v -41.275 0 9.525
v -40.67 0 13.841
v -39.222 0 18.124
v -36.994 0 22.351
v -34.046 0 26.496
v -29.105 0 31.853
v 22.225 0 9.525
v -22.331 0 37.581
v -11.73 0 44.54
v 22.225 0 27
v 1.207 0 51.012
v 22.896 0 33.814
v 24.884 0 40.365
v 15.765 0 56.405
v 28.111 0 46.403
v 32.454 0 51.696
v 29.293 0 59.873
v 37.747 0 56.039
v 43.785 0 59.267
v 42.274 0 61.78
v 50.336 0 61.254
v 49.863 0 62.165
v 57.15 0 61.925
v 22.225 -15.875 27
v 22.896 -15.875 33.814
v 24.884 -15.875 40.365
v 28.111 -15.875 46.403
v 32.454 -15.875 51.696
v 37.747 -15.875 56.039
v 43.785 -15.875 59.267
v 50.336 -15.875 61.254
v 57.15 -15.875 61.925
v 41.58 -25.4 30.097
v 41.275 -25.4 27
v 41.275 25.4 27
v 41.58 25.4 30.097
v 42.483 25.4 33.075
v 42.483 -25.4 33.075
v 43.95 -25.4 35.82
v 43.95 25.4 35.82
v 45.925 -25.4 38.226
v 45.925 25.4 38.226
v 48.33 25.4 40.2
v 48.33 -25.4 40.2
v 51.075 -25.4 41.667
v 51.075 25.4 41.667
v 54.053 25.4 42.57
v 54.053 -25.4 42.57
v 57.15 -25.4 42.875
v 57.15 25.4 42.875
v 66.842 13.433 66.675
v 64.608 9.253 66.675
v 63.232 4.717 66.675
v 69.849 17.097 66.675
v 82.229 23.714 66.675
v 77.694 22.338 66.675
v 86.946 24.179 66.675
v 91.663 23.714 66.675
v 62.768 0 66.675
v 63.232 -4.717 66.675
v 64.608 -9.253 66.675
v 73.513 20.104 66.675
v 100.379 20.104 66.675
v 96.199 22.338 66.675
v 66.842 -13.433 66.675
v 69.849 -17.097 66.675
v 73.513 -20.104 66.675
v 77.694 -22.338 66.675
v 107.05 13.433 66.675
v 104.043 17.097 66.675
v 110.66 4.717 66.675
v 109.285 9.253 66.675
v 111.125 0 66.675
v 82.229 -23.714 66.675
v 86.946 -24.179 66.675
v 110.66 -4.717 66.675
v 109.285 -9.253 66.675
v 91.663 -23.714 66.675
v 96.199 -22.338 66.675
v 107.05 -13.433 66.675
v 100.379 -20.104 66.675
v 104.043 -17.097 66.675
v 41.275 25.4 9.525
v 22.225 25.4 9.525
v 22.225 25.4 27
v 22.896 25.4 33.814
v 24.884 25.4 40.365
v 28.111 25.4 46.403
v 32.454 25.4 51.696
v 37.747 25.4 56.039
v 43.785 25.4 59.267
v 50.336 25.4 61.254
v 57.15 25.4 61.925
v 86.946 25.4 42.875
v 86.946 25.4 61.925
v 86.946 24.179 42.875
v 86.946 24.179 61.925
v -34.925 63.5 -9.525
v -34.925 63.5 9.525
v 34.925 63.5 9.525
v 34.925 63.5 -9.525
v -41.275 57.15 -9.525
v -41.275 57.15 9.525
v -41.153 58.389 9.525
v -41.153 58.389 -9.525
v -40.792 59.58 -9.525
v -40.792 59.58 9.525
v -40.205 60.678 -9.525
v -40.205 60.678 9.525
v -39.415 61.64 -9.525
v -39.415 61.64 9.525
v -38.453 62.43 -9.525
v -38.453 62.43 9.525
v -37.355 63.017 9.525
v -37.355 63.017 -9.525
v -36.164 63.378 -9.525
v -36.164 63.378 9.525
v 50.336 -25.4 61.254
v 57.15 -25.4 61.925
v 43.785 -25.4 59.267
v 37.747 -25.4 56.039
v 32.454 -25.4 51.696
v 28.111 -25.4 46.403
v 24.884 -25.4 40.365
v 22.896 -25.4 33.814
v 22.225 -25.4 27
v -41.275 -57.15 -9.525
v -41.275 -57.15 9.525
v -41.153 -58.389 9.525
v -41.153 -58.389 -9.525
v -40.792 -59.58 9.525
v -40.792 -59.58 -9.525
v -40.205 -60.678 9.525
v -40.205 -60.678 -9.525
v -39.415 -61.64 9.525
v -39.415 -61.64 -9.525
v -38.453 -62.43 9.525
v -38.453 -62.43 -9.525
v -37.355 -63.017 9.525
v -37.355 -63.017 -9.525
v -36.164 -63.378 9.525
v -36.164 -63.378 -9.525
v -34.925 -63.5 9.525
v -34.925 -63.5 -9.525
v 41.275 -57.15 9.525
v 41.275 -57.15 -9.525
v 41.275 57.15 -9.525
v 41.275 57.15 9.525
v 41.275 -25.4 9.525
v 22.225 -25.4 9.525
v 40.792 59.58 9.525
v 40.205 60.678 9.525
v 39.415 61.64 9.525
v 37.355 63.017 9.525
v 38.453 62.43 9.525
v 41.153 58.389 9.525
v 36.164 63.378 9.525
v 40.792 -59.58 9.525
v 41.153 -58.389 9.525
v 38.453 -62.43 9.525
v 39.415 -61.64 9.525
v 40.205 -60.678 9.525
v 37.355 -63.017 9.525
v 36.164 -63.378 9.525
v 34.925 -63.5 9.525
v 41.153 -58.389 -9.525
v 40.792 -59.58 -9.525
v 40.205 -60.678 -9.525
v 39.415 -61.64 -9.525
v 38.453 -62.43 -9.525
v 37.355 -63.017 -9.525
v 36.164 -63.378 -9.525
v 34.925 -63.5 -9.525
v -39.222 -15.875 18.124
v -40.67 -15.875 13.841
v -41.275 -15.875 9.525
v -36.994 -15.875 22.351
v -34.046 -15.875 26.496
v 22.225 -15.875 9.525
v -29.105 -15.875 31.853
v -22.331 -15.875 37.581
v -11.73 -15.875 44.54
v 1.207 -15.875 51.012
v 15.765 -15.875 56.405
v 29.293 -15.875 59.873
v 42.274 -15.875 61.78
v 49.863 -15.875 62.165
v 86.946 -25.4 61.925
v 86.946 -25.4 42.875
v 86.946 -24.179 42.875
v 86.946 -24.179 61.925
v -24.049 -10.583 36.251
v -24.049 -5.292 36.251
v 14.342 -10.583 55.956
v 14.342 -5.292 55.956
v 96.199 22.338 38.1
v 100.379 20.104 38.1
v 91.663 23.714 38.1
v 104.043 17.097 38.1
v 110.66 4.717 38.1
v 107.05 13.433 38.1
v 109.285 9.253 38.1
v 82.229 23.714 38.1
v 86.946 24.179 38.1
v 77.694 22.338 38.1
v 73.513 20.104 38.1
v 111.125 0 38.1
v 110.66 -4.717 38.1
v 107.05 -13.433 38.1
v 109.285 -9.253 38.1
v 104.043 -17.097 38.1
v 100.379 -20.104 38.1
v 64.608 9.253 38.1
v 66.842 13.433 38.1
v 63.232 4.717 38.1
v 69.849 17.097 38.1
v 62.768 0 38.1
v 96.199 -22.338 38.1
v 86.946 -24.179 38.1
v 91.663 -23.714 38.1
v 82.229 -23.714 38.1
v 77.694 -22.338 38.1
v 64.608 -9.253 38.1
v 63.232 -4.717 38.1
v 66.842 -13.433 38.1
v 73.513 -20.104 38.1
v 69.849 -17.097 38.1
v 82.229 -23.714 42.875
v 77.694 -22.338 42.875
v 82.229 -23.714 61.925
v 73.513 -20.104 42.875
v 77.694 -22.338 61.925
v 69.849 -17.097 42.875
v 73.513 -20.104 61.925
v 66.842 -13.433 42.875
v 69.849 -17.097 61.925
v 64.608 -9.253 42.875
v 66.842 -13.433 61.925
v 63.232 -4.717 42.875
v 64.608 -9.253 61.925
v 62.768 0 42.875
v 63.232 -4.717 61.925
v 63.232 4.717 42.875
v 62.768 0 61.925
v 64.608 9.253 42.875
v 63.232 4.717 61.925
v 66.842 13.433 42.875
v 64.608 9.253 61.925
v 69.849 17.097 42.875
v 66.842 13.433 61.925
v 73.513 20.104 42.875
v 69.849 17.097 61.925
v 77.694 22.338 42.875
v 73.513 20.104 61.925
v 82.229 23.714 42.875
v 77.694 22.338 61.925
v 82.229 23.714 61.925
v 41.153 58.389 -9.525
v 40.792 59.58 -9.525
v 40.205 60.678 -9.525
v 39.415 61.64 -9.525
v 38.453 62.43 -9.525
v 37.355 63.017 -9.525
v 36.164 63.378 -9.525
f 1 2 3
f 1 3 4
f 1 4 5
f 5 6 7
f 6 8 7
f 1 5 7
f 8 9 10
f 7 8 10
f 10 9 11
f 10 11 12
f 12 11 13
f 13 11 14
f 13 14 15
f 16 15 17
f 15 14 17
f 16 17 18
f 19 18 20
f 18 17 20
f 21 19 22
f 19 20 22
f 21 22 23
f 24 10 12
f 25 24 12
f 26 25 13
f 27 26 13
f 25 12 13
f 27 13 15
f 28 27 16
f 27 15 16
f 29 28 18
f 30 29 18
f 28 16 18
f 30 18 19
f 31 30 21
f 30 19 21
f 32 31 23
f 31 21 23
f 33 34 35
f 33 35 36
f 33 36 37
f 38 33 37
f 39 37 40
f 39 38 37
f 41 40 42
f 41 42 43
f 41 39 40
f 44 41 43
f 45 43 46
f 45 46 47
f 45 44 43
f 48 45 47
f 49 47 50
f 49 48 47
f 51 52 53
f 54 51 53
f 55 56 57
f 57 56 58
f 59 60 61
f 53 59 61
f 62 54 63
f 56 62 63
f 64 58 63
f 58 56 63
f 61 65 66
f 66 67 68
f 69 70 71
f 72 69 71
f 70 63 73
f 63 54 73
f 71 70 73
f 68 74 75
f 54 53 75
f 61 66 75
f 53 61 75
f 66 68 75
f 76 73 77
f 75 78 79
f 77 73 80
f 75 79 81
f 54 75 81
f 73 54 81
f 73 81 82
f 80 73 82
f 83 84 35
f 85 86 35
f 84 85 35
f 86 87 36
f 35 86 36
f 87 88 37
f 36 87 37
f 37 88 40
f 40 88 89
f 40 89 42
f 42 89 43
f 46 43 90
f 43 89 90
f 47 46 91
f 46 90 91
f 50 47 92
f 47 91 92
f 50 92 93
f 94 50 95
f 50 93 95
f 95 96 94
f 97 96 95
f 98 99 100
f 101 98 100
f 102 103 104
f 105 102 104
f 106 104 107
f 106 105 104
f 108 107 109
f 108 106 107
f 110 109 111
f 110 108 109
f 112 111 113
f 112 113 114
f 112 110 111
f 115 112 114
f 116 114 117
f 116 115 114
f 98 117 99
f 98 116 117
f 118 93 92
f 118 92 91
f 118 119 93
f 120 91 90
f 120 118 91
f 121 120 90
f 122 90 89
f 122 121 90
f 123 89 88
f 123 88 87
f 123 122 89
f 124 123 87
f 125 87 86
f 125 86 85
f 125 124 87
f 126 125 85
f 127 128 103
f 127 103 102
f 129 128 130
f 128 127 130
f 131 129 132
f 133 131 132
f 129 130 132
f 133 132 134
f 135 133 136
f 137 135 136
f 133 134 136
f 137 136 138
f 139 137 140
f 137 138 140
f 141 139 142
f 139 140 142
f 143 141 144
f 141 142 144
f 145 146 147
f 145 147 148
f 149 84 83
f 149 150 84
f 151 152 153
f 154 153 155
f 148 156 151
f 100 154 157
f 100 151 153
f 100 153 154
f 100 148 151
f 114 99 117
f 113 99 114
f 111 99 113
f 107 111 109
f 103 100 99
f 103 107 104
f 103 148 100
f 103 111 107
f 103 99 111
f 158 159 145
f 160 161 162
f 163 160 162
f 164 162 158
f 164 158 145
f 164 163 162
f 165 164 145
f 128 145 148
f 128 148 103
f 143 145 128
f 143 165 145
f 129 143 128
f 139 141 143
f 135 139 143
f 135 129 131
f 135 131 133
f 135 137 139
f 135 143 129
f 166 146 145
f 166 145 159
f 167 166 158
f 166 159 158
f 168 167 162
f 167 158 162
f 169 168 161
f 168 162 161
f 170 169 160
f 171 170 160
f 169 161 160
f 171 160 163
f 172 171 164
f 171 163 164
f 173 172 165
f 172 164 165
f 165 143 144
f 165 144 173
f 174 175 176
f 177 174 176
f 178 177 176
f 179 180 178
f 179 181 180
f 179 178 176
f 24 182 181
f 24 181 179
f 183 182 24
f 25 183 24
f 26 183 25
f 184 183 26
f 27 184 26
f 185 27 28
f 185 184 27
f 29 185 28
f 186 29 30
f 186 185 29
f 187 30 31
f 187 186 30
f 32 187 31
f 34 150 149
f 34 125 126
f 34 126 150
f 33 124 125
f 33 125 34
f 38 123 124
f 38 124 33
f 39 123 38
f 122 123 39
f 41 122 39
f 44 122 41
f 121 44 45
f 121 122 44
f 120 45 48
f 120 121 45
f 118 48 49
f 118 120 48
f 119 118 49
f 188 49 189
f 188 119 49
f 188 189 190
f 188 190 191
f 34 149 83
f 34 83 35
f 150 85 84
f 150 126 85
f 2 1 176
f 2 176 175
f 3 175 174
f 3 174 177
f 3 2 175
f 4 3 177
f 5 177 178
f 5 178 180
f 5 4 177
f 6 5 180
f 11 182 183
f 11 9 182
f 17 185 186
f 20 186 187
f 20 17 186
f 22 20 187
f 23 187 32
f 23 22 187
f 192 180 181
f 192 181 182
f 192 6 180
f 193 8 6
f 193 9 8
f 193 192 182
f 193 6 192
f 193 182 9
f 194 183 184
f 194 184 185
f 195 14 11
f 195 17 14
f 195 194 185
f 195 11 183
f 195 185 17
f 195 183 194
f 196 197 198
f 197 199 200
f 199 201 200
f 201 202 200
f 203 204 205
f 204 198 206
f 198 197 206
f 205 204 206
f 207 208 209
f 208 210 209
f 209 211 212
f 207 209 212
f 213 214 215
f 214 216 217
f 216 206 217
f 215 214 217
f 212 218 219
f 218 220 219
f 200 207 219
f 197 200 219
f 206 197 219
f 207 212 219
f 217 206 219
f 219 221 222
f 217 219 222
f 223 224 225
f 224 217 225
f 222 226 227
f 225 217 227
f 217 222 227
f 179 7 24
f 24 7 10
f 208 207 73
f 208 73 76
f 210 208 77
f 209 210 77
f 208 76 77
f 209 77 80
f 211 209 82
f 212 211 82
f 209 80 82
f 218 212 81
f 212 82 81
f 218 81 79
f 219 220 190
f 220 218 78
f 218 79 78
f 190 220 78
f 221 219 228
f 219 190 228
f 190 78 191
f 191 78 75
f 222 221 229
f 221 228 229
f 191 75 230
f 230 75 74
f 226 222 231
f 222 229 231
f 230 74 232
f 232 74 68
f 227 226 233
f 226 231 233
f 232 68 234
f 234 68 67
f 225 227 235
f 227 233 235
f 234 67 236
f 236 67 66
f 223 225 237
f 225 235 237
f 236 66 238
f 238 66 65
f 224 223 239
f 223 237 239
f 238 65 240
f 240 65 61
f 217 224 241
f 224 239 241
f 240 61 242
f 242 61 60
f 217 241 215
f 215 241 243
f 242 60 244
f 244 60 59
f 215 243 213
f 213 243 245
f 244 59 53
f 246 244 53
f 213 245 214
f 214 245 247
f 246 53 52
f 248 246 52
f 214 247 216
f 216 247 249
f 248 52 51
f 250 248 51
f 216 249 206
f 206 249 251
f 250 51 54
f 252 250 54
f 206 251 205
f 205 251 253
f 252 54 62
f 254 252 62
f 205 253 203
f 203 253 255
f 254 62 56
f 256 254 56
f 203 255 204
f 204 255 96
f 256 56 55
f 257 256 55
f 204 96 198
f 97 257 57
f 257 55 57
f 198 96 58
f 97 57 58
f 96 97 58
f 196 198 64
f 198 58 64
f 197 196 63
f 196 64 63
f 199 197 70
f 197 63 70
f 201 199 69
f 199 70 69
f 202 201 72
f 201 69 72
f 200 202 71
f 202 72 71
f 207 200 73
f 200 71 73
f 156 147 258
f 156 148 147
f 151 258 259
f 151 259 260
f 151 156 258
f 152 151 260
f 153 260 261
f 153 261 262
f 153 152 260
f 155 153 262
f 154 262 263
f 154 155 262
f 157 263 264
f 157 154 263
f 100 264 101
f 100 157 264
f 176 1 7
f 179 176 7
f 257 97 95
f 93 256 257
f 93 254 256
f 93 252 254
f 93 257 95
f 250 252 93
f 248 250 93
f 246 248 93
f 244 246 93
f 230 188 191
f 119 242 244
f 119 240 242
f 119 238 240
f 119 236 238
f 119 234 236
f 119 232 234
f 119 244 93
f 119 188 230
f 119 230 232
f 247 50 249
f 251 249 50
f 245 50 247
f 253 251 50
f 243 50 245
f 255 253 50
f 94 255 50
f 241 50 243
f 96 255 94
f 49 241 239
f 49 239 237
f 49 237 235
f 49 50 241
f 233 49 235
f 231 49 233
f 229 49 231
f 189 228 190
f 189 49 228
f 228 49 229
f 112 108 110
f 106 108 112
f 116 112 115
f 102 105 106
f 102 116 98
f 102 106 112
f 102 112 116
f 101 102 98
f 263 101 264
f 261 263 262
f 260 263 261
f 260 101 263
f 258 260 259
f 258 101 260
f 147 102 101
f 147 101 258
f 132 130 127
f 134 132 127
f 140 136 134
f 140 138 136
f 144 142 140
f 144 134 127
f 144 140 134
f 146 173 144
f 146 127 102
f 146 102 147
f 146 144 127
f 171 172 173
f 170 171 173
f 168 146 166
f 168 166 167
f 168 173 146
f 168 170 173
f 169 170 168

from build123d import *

# Parameters (mm, degrees)
F1_DEPTH = 63.5
F0_W     = 26.6213221727
F0_H     = 19.05
F2_DEPTH = 25.4
F3_DEPTH = 15.875
F5_R     = 6.35


with BuildPart() as f1:
    # F0 (on Front) → F1 (new body, symmetric)
    with BuildSketch(Plane.XZ):
        Polygon((41.275, -9.525), (41.275, 9.525), (22.225, 9.525), (-41.275, 9.525), (-41.275, -9.525), align=None)
    extrude(amount=F1_DEPTH, both=True)

    # F5
    f5_edges = [f1.edges().sort_by_distance(p)[0] for p in [
        (41.275, -63.5, 0),
        (-41.275, -63.5, 0),
        (-41.275, 63.5, 0),
        (41.275, 63.5, 0),
    ]]
    fillet(f5_edges, radius=F5_R)


with BuildPart() as f2:
    # F0 (on Front) → F2 (new body, symmetric)
    with BuildSketch(Plane.XZ):
        with BuildLine():
            Line((22.225, 9.525), (41.275, 9.525))
            Line((41.275, 9.525), (41.275, 27.0002))
            ThreePointArc((41.275, 27.0002), (45.9246798487, 38.2255201513), (57.15, 42.8752))
            Line((57.15, 42.8752), (60.325, 42.8752))
            Line((60.325, 42.8752), (60.325, 61.9252))
            Line((60.325, 61.9252), (57.15, 61.9252))
            ThreePointArc((57.15, 61.9252), (32.4542956671, 51.6959043329), (22.225, 27.0002))
            Line((22.225, 27.0002), (22.225, 9.525))
        make_face()
        with Locations((73.6356610864, 52.4002)):
            Rectangle(F0_W, F0_H)
    extrude(amount=F2_DEPTH, both=True)

    # F0 (on Front) → F4 (revolve)
    with BuildSketch(Plane.XZ):
        Polygon((86.9463221727, 61.9252), (86.9463221727, 42.8752), (86.9463221727, 38.1), (111.125, 38.1), (111.125, 66.675), (86.9463221727, 66.675), align=None)
    revolve(axis=Axis((86.9463221727, 0, 52.3875), (0, 0, -1)))


with BuildPart() as f3:
    # F0 (on Front) → F3 (new body)
    with BuildSketch(Plane.XZ):
        with BuildLine():
            Line((-41.275, 9.525), (22.225, 9.525))
            Line((22.225, 9.525), (22.225, 27.0002))
            ThreePointArc((22.225, 27.0002), (32.4542956671, 51.6959043329), (57.15, 61.9252))
            add(Edge.make_bspline(
                [(-41.275, 9.525), (-40.2140691876, 37.5248529017), (17.7157502621, 65.0603249669), (57.15, 61.9252)],
                knots=[0, 0, 0, 0, 111.5045361635, 111.5045361635, 111.5045361635, 111.5045361635], degree=3))
        make_face()
    extrude(amount=F3_DEPTH)


solid = Compound([f1.part, f2.part, f3.part])
